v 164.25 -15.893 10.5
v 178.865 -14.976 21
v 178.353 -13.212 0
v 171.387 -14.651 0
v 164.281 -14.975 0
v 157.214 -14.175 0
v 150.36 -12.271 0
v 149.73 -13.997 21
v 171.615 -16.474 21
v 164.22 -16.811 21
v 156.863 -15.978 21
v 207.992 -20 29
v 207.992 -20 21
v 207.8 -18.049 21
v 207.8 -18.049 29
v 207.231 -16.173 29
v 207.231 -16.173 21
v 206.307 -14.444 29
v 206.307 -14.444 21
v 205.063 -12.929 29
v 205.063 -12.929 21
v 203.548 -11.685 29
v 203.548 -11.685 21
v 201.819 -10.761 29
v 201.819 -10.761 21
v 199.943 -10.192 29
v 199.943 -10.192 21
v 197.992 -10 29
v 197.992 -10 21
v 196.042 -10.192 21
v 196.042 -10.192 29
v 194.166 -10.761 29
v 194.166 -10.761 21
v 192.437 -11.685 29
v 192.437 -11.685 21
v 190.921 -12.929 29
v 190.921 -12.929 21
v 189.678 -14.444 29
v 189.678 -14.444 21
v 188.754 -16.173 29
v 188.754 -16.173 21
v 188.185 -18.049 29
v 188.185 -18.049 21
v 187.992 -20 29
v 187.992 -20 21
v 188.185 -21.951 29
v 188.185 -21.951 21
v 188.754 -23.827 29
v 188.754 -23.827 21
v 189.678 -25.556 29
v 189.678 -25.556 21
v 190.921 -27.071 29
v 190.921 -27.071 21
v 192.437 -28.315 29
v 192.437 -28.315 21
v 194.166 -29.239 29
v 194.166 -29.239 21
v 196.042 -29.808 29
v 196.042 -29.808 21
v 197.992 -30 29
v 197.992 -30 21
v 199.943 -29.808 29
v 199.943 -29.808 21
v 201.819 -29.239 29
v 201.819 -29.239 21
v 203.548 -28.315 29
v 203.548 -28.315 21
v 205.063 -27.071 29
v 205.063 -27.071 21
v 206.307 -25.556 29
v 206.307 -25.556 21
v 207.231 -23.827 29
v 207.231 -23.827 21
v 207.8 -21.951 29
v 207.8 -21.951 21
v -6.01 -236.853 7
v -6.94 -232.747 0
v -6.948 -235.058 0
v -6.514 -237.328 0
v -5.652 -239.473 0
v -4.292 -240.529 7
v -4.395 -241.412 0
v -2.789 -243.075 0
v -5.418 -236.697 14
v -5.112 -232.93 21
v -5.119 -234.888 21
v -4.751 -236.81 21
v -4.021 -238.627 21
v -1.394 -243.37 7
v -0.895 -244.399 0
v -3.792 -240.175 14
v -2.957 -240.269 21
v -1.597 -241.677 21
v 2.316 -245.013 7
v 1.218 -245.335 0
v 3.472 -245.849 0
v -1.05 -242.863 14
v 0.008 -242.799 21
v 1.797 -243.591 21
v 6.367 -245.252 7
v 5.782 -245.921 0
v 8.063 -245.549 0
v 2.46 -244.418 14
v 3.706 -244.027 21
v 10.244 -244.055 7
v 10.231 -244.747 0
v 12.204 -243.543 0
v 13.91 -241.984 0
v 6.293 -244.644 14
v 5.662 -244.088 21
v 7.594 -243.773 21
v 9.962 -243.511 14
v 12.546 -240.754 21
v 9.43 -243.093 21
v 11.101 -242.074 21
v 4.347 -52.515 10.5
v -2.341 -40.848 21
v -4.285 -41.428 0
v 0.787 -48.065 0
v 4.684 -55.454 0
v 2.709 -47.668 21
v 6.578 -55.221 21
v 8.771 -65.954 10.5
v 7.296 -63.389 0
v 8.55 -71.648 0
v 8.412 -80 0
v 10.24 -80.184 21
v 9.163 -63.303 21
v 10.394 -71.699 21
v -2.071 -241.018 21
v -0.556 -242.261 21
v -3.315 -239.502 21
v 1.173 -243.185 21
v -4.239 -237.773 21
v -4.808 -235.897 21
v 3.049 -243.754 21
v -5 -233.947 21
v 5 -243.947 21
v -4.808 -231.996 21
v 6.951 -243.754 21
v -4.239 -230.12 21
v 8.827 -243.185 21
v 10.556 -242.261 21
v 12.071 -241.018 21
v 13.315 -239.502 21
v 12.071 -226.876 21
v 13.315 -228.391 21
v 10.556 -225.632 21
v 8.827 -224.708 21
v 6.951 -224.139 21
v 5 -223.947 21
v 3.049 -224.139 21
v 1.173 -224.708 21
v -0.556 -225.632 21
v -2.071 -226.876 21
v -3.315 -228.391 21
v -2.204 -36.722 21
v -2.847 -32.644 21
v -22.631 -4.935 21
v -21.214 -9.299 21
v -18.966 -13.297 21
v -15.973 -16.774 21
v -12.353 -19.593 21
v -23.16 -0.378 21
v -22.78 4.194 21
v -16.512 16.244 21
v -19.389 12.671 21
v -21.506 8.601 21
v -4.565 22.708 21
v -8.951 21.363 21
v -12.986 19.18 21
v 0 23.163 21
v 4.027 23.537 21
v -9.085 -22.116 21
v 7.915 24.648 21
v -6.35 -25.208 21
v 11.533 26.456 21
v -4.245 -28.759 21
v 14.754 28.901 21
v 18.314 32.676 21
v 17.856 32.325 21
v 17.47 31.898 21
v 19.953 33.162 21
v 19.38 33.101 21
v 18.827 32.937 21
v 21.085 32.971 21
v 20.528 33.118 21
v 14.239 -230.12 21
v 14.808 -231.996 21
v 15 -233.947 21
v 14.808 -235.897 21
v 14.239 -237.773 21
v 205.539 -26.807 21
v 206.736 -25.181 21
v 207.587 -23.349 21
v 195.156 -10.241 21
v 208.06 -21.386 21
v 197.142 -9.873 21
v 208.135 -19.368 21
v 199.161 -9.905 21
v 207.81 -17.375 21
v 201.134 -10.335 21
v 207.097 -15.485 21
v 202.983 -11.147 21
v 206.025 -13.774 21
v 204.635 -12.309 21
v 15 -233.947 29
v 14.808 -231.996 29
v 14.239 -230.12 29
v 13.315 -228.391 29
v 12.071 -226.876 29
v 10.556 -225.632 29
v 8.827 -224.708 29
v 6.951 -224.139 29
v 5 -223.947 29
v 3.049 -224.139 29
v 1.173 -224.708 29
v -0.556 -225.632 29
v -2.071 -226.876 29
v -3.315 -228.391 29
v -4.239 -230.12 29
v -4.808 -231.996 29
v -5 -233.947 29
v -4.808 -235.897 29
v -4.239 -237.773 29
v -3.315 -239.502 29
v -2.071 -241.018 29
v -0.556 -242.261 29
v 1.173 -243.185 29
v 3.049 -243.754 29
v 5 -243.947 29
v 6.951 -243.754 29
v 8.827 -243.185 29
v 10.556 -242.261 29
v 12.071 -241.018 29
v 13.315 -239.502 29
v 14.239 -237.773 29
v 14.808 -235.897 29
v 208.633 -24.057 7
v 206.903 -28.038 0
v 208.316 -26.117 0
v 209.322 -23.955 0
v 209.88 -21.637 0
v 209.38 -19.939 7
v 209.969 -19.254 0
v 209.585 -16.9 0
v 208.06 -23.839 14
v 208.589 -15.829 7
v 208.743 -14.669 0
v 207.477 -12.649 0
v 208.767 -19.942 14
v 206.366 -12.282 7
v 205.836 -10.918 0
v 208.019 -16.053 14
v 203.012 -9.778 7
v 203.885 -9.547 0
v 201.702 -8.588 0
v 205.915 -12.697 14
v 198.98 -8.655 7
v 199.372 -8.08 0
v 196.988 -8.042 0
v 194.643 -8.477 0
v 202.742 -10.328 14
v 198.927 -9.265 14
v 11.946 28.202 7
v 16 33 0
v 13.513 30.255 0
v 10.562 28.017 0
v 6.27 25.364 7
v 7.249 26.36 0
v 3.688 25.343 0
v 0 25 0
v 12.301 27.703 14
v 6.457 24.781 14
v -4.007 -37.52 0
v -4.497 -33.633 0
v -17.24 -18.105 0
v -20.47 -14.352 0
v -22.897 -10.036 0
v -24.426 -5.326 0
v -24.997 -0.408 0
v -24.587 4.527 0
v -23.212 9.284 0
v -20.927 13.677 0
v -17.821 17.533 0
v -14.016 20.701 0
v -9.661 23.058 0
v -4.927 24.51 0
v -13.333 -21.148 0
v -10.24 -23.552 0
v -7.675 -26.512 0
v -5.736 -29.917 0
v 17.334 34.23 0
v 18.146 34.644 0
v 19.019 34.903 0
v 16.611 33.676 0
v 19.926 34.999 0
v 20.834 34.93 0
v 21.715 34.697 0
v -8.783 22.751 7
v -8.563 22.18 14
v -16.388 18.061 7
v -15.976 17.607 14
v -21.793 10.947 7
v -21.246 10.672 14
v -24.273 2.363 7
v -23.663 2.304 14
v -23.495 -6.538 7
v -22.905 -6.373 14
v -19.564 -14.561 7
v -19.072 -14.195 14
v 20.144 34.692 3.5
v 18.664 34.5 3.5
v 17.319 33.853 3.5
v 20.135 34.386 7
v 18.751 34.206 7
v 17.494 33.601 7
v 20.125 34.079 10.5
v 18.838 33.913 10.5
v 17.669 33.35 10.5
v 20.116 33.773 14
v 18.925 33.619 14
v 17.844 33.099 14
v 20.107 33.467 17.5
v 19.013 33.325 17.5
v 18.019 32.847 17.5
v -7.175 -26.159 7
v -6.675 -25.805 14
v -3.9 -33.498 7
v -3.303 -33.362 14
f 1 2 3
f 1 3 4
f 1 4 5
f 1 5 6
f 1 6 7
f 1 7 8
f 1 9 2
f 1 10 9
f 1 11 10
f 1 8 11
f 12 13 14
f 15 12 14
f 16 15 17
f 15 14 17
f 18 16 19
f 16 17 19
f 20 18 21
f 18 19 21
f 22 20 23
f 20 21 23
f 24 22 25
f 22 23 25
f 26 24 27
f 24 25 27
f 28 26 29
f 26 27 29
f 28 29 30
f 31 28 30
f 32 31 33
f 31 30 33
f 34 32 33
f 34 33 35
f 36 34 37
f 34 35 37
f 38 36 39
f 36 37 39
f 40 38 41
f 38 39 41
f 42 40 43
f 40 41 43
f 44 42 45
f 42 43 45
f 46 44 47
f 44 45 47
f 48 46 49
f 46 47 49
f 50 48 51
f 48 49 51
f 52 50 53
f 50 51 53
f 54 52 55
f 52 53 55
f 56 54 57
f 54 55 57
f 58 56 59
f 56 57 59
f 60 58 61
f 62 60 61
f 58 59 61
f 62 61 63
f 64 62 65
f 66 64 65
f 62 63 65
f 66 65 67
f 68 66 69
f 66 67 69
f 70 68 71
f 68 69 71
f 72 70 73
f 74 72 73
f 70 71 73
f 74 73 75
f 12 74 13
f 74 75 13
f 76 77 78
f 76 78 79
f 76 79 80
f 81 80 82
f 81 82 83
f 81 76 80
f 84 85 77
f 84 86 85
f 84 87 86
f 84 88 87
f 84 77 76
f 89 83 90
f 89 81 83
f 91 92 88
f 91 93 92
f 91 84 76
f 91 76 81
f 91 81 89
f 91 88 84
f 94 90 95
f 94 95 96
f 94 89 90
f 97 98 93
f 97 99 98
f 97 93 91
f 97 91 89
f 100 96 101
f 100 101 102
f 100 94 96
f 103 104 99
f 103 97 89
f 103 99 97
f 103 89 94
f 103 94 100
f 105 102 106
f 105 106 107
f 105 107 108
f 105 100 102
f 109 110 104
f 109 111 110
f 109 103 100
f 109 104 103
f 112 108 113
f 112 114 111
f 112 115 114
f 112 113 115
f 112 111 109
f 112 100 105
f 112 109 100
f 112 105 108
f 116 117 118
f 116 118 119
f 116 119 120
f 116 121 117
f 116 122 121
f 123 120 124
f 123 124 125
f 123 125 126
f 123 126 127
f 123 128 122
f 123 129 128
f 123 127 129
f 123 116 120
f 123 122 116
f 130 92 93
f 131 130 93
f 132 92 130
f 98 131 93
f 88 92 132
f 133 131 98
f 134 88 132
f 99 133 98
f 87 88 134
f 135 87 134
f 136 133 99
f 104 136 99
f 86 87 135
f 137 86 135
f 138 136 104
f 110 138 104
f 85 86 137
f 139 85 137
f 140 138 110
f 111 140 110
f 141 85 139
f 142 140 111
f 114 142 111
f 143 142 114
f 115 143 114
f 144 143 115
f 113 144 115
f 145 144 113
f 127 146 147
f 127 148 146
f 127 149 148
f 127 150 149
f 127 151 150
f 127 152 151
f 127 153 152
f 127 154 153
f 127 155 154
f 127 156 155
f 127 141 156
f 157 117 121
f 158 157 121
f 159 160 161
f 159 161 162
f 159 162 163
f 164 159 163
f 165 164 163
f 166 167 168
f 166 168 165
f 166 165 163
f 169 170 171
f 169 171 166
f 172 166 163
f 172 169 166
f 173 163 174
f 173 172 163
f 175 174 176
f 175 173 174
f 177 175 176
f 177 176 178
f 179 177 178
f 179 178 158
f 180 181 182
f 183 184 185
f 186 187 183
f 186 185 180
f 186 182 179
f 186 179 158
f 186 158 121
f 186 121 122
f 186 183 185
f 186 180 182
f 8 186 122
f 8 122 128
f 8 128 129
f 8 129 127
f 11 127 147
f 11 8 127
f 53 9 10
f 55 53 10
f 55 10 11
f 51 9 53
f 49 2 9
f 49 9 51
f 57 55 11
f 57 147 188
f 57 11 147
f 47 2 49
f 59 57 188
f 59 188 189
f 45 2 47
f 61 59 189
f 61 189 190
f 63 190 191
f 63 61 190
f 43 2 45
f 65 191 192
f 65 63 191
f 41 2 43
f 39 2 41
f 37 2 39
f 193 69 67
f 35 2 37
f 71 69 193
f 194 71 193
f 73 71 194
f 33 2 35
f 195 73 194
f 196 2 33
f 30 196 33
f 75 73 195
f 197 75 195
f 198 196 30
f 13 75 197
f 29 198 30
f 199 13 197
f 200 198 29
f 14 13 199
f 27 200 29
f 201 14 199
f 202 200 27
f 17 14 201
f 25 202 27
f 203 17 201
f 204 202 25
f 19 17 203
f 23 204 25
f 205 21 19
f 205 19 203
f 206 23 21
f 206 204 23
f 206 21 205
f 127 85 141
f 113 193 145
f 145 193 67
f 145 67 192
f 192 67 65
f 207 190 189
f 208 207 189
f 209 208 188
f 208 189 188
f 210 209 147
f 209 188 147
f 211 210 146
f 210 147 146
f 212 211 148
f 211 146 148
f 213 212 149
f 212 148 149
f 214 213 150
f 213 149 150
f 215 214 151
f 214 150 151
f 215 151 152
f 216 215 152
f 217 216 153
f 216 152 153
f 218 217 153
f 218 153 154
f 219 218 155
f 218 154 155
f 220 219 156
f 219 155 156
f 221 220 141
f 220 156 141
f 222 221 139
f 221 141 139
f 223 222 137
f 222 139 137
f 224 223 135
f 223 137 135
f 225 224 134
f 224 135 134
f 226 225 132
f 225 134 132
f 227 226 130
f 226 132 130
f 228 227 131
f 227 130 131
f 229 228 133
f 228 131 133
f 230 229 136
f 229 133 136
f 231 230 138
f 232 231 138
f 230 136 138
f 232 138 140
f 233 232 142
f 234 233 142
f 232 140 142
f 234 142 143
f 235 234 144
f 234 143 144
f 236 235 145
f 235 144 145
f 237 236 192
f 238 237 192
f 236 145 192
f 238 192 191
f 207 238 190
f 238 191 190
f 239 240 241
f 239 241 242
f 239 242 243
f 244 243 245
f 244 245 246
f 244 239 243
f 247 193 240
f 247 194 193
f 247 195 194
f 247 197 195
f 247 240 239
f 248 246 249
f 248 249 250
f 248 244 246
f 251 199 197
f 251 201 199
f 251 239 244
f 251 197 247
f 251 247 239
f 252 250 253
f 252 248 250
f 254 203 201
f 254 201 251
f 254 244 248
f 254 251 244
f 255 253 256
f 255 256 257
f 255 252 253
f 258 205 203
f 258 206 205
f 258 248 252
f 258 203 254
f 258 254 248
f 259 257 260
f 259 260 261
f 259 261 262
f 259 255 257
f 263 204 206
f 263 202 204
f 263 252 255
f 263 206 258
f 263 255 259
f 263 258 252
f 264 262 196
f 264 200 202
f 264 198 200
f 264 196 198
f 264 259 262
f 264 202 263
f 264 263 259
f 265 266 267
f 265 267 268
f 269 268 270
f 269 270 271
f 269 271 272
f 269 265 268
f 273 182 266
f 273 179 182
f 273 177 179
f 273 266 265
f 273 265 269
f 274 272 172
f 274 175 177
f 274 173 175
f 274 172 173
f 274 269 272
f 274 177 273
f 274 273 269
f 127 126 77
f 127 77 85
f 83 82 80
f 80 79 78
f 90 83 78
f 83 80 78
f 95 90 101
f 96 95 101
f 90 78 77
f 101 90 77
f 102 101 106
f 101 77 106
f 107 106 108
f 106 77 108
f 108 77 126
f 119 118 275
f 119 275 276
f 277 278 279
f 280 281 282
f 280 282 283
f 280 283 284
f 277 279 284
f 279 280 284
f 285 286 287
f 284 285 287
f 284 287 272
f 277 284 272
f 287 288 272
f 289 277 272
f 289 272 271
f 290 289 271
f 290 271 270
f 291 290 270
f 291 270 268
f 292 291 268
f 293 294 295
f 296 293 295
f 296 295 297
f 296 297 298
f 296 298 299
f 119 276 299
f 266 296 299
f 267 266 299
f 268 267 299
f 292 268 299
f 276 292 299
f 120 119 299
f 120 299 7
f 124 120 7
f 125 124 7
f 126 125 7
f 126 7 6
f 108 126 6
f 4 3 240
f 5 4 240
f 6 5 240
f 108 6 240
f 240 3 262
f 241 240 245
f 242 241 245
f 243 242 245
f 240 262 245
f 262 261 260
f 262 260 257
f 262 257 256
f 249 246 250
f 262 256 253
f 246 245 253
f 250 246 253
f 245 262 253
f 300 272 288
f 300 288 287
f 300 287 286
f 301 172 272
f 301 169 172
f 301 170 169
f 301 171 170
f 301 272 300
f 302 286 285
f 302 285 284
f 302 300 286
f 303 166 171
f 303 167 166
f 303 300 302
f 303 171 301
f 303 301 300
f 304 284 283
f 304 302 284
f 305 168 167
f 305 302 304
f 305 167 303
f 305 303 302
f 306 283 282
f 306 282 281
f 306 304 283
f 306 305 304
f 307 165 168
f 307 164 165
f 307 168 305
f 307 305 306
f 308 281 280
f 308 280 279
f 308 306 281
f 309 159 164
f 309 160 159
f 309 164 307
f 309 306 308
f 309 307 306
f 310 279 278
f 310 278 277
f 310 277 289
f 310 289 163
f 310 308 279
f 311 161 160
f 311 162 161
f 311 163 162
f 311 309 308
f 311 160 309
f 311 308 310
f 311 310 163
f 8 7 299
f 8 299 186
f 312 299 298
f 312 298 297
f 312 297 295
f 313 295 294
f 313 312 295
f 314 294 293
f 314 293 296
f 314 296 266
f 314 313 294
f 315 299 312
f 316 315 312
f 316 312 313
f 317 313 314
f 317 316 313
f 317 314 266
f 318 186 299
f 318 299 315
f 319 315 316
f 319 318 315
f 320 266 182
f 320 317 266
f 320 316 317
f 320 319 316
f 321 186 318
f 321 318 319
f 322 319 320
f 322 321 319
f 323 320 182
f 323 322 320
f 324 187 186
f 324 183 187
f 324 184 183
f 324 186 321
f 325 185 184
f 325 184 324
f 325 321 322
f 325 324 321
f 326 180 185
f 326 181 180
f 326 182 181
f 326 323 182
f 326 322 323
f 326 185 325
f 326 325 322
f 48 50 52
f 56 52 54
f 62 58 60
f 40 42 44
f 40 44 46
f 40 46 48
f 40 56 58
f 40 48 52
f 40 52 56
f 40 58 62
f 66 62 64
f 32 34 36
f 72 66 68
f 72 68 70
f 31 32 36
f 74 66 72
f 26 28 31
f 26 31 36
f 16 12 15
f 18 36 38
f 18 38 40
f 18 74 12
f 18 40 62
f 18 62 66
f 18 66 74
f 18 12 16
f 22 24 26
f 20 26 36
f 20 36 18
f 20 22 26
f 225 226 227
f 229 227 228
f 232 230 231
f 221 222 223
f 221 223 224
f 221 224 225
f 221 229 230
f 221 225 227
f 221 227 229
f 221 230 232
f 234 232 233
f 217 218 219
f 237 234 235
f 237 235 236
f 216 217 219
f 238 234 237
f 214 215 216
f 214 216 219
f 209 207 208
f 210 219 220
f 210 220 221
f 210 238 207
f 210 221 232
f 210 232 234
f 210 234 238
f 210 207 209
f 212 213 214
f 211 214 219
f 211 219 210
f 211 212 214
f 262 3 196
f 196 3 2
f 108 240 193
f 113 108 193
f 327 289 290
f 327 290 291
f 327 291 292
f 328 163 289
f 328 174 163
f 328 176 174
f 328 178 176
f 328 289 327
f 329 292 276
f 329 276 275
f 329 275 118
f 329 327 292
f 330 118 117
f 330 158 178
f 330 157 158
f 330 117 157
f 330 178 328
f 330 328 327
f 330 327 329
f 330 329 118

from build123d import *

# Parameters (mm, degrees)
EXTRUDE_1_DEPTH = 21
EXTRUDE_1_TAPER = 5
SKETCH_2_R      = 10
EXTRUDE_2_DEPTH = 8


with BuildPart() as part:
    # Эскиз1 → Бобышка-Вытянуть1 (new body)
    with BuildSketch(Plane.XY):
        with BuildLine():
            ThreePointArc((206.902825712, -28.037707575), (208.16042902, -13.627270923), (194.643197369, -8.47686326))
            Line((194.643197369, -8.47686326), (178.352602864, -13.211762774))
            ThreePointArc((178.352602864, -13.211762774), (164.281318134, -14.974601832), (150.3601632, -12.270882024))
            Line((150.3601632, -12.270882024), (21.714759937, 34.696764669))
            ThreePointArc((21.714759937, 34.696764669), (18.576858011, 34.793189635), (16, 33))
            ThreePointArc((16, 33), (8.94427191, 27.11145618), (0, 25))
            ThreePointArc((0, 25), (-24.017605322, 6.939354046), (-13.333333333, -21.147629234))
            ThreePointArc((-13.333333333, -21.147629234), (-5.735545873, -29.916516988), (-4.284649798, -41.428018512))
            ThreePointArc((-4.284649798, -41.428018512), (6.155658081, -59.36704661), (8.411759167, -80))
            Line((8.411759167, -80), (-6.939849245, -232.746575098))
            ThreePointArc((-6.939849245, -232.746575098), (0.139115456, -244.91798346), (13.910401615, -241.984282673))
            Line((13.910401615, -241.984282673), (206.902825712, -28.037707575))
        make_face()
    extrude(amount=EXTRUDE_1_DEPTH, taper=EXTRUDE_1_TAPER)

    # Эскиз2 → Бобышка-Вытянуть2 (add)
    with BuildSketch(Plane.XY.offset(21)):
        with Locations((5, -233.946575098)):
            Circle(SKETCH_2_R)
        with Locations((197.992424097, -20)):
            Circle(SKETCH_2_R)
    extrude(amount=EXTRUDE_2_DEPTH)


solid = part.part
